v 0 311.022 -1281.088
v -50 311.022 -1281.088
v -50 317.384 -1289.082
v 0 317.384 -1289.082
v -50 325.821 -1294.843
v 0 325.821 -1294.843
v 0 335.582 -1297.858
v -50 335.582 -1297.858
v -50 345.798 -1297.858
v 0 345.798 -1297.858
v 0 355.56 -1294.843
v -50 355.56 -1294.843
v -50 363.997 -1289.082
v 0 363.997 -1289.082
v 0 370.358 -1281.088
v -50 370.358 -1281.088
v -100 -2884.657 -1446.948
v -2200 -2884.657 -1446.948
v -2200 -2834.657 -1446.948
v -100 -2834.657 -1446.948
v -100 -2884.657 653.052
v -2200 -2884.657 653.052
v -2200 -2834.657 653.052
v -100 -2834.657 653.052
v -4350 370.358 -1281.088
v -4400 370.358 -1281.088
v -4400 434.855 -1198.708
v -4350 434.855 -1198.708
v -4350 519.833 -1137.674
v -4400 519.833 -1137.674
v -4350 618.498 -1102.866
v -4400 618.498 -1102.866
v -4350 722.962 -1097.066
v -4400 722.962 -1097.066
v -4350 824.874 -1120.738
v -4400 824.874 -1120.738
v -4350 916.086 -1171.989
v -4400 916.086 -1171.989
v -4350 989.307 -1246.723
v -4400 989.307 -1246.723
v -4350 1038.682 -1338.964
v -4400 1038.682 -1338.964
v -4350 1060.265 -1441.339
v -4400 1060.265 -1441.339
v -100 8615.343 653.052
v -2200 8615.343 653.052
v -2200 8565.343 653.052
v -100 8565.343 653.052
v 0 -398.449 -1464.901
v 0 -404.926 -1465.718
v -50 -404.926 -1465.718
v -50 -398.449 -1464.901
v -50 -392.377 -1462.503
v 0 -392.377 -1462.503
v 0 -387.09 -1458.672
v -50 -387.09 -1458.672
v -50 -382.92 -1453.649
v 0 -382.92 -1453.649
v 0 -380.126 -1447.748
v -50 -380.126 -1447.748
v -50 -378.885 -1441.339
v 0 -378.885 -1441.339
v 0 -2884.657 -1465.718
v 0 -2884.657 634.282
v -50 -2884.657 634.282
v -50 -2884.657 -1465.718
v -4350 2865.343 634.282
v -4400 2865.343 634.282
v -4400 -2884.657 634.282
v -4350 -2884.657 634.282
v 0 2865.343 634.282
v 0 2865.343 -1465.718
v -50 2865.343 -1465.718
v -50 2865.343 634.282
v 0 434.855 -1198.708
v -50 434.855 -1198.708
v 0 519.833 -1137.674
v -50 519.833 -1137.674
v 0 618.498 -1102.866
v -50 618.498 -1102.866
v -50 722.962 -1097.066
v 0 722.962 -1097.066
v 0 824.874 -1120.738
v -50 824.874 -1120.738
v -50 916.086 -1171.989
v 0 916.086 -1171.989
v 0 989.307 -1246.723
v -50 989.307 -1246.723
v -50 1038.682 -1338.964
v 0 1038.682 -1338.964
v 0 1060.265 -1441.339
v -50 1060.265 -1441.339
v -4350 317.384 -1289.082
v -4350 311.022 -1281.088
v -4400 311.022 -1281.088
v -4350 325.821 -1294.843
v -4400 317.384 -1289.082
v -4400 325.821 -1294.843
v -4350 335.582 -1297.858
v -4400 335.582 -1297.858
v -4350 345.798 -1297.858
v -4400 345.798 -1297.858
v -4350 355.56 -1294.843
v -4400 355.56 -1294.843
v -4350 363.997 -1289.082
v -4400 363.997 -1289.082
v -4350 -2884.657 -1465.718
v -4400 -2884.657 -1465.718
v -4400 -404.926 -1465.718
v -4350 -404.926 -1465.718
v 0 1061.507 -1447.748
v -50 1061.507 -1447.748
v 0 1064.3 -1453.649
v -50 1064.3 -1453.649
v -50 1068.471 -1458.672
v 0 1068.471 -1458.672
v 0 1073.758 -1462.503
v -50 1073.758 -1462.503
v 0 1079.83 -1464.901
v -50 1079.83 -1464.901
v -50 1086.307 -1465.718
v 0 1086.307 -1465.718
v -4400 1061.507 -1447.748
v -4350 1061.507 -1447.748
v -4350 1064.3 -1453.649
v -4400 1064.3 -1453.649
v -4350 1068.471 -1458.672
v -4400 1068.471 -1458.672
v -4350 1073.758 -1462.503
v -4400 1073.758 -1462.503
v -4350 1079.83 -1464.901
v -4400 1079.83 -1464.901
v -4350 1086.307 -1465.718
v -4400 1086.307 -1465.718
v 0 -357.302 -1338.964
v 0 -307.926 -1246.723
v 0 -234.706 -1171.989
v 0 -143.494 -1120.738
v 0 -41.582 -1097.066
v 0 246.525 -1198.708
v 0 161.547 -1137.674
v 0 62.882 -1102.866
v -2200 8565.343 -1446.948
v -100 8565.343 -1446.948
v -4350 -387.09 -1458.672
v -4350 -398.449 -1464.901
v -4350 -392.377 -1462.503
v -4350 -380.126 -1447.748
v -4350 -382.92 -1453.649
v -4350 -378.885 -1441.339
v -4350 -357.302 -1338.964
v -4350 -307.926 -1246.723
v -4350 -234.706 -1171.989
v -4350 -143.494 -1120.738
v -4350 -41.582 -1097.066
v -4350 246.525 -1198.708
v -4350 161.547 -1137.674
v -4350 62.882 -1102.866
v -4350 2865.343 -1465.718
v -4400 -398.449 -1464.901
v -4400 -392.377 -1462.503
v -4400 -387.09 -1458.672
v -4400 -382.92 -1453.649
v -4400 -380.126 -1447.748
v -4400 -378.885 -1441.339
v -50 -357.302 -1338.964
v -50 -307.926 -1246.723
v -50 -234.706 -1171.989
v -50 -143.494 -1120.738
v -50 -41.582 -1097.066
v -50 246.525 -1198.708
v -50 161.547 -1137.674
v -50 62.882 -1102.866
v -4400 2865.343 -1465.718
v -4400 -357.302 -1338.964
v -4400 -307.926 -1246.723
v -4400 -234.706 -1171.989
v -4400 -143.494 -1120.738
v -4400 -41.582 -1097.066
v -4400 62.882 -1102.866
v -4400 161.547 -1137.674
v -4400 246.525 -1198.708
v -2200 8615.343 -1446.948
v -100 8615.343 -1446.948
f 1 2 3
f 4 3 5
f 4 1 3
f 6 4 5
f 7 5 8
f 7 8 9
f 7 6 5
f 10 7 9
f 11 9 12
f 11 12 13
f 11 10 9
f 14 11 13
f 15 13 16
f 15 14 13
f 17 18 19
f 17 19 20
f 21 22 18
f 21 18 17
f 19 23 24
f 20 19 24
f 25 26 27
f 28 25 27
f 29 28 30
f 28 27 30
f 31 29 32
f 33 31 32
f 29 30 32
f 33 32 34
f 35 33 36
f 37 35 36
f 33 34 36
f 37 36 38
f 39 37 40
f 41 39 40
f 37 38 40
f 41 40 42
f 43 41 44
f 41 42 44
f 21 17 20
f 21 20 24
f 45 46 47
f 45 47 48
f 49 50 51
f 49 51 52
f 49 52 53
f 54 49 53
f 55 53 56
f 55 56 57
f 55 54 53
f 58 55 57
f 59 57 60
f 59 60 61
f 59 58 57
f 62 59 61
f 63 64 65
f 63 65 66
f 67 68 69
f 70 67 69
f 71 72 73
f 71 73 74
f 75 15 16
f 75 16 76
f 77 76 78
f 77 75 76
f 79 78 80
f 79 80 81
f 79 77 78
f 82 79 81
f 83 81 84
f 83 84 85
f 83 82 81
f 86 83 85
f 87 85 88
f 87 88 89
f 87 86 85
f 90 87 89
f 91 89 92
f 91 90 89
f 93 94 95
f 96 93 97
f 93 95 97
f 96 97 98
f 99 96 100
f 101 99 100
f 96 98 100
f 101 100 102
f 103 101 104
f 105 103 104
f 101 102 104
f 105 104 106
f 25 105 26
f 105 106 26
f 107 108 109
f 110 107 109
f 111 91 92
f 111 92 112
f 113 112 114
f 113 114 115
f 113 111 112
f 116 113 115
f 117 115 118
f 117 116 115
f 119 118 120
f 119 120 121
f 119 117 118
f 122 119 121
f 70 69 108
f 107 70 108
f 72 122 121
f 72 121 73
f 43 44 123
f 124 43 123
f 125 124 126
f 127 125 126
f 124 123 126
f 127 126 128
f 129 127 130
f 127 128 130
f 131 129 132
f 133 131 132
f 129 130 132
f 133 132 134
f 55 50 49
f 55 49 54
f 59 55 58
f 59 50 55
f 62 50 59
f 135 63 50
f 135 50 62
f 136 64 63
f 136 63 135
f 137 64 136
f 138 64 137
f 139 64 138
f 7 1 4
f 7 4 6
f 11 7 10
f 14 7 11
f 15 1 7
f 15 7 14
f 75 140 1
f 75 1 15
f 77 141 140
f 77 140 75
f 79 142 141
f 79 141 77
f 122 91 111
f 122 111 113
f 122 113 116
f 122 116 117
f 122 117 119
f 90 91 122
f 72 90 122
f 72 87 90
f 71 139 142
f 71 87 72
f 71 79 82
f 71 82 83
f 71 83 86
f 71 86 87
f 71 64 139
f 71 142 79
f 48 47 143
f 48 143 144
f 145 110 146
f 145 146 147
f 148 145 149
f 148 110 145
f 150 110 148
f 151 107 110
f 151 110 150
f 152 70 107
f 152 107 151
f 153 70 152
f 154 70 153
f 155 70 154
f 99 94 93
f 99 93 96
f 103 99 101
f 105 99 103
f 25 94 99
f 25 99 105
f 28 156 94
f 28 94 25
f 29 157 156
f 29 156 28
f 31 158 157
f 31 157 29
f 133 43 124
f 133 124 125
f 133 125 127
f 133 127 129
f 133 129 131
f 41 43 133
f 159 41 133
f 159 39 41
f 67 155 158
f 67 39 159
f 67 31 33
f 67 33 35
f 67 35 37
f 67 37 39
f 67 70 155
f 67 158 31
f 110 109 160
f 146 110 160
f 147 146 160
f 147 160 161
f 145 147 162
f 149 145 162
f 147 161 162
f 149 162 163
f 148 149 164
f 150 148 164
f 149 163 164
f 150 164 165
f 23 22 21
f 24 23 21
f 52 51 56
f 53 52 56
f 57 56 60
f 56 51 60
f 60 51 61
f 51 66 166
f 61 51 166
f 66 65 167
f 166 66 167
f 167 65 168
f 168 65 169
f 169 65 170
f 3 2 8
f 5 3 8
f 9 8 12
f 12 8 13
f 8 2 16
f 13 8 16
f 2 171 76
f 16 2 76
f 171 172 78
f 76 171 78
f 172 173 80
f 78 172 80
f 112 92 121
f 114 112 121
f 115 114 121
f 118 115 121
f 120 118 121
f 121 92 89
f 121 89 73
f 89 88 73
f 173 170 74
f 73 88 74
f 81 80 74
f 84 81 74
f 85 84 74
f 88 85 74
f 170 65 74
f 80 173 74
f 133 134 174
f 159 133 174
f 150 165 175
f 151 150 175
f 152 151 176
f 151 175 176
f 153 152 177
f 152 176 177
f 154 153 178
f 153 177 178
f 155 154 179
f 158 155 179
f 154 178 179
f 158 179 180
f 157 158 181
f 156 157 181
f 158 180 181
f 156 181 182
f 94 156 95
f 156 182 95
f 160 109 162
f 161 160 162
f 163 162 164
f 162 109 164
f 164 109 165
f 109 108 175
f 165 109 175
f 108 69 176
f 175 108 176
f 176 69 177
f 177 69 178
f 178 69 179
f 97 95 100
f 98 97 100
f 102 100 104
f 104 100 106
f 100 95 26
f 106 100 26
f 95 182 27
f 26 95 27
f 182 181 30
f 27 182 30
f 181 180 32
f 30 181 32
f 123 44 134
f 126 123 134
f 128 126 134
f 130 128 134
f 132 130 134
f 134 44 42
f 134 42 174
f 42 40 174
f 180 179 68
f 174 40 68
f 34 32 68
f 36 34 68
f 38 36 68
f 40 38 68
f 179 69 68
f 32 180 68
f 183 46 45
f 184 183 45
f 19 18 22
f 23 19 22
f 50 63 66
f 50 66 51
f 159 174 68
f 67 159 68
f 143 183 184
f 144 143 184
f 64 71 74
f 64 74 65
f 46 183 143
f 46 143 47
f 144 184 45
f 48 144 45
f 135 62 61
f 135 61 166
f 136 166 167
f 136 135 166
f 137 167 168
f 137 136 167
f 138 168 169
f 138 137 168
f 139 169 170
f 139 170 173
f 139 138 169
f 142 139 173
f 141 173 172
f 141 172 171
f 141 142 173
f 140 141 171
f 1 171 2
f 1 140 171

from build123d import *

# Parameters (mm, degrees)
F1_DEPTH = 50
F2_W     = 2100
F2_H     = 2100
F3_DEPTH = 50


with BuildPart() as f1:
    # F0 (on Right) → F1 (new body)
    with BuildSketch(Plane.YZ):
        with BuildLine():
            Line((1086.307005, -1465.717785), (2865.342966, -1465.717785))
            Line((2865.342966, -1465.717785), (2865.342966, 634.282215))
            Line((2865.342966, 634.282215), (-2884.657034, 634.282215))
            Line((-2884.657034, 634.282215), (-2884.657034, -1465.717785))
            Line((-2884.657034, -1465.717785), (-404.926433, -1465.717785))
            ThreePointArc((-404.926433, -1465.717785), (-387.090337, -1458.671957), (-378.884713, -1441.338816))
            ThreePointArc((-378.884713, -1441.338816), (-93.378544, -1105.281769), (311.022482, -1281.08826))
            ThreePointArc((311.022482, -1281.08826), (340.690286, -1298.240817), (370.358091, -1281.08826))
            ThreePointArc((370.358091, -1281.08826), (774.759116, -1105.281769), (1060.265285, -1441.338816))
            ThreePointArc((1060.265285, -1441.338816), (1068.470909, -1458.671957), (1086.307005, -1465.717785))
        make_face()
    extrude(amount=-F1_DEPTH)


with BuildPart() as f3:
    # F2 (on face) → F3 (new body)
    with BuildSketch(Plane.XZ.offset(2884.657034)):
        with Locations((-1150, -396.947932)):
            Rectangle(F2_W, F2_H)
    extrude(amount=-F3_DEPTH)


with BuildPart() as f4_1:
    # F4: instance of F1
    add(f1.part.mirror(Plane(origin=(-2200, -2859.657034, -396.947932), x_dir=(0, -1, 0), z_dir=(-1, 0, 0))))


with BuildPart() as f5_1:
    # F5: instance of F3
    add(f3.part.mirror(Plane(origin=(-25, 2865.342966, -415.717785), x_dir=(-1, 0, 0), z_dir=(0, 1, 0))))


solid = Compound([f1.part, f3.part, f4_1.part, f5_1.part])
